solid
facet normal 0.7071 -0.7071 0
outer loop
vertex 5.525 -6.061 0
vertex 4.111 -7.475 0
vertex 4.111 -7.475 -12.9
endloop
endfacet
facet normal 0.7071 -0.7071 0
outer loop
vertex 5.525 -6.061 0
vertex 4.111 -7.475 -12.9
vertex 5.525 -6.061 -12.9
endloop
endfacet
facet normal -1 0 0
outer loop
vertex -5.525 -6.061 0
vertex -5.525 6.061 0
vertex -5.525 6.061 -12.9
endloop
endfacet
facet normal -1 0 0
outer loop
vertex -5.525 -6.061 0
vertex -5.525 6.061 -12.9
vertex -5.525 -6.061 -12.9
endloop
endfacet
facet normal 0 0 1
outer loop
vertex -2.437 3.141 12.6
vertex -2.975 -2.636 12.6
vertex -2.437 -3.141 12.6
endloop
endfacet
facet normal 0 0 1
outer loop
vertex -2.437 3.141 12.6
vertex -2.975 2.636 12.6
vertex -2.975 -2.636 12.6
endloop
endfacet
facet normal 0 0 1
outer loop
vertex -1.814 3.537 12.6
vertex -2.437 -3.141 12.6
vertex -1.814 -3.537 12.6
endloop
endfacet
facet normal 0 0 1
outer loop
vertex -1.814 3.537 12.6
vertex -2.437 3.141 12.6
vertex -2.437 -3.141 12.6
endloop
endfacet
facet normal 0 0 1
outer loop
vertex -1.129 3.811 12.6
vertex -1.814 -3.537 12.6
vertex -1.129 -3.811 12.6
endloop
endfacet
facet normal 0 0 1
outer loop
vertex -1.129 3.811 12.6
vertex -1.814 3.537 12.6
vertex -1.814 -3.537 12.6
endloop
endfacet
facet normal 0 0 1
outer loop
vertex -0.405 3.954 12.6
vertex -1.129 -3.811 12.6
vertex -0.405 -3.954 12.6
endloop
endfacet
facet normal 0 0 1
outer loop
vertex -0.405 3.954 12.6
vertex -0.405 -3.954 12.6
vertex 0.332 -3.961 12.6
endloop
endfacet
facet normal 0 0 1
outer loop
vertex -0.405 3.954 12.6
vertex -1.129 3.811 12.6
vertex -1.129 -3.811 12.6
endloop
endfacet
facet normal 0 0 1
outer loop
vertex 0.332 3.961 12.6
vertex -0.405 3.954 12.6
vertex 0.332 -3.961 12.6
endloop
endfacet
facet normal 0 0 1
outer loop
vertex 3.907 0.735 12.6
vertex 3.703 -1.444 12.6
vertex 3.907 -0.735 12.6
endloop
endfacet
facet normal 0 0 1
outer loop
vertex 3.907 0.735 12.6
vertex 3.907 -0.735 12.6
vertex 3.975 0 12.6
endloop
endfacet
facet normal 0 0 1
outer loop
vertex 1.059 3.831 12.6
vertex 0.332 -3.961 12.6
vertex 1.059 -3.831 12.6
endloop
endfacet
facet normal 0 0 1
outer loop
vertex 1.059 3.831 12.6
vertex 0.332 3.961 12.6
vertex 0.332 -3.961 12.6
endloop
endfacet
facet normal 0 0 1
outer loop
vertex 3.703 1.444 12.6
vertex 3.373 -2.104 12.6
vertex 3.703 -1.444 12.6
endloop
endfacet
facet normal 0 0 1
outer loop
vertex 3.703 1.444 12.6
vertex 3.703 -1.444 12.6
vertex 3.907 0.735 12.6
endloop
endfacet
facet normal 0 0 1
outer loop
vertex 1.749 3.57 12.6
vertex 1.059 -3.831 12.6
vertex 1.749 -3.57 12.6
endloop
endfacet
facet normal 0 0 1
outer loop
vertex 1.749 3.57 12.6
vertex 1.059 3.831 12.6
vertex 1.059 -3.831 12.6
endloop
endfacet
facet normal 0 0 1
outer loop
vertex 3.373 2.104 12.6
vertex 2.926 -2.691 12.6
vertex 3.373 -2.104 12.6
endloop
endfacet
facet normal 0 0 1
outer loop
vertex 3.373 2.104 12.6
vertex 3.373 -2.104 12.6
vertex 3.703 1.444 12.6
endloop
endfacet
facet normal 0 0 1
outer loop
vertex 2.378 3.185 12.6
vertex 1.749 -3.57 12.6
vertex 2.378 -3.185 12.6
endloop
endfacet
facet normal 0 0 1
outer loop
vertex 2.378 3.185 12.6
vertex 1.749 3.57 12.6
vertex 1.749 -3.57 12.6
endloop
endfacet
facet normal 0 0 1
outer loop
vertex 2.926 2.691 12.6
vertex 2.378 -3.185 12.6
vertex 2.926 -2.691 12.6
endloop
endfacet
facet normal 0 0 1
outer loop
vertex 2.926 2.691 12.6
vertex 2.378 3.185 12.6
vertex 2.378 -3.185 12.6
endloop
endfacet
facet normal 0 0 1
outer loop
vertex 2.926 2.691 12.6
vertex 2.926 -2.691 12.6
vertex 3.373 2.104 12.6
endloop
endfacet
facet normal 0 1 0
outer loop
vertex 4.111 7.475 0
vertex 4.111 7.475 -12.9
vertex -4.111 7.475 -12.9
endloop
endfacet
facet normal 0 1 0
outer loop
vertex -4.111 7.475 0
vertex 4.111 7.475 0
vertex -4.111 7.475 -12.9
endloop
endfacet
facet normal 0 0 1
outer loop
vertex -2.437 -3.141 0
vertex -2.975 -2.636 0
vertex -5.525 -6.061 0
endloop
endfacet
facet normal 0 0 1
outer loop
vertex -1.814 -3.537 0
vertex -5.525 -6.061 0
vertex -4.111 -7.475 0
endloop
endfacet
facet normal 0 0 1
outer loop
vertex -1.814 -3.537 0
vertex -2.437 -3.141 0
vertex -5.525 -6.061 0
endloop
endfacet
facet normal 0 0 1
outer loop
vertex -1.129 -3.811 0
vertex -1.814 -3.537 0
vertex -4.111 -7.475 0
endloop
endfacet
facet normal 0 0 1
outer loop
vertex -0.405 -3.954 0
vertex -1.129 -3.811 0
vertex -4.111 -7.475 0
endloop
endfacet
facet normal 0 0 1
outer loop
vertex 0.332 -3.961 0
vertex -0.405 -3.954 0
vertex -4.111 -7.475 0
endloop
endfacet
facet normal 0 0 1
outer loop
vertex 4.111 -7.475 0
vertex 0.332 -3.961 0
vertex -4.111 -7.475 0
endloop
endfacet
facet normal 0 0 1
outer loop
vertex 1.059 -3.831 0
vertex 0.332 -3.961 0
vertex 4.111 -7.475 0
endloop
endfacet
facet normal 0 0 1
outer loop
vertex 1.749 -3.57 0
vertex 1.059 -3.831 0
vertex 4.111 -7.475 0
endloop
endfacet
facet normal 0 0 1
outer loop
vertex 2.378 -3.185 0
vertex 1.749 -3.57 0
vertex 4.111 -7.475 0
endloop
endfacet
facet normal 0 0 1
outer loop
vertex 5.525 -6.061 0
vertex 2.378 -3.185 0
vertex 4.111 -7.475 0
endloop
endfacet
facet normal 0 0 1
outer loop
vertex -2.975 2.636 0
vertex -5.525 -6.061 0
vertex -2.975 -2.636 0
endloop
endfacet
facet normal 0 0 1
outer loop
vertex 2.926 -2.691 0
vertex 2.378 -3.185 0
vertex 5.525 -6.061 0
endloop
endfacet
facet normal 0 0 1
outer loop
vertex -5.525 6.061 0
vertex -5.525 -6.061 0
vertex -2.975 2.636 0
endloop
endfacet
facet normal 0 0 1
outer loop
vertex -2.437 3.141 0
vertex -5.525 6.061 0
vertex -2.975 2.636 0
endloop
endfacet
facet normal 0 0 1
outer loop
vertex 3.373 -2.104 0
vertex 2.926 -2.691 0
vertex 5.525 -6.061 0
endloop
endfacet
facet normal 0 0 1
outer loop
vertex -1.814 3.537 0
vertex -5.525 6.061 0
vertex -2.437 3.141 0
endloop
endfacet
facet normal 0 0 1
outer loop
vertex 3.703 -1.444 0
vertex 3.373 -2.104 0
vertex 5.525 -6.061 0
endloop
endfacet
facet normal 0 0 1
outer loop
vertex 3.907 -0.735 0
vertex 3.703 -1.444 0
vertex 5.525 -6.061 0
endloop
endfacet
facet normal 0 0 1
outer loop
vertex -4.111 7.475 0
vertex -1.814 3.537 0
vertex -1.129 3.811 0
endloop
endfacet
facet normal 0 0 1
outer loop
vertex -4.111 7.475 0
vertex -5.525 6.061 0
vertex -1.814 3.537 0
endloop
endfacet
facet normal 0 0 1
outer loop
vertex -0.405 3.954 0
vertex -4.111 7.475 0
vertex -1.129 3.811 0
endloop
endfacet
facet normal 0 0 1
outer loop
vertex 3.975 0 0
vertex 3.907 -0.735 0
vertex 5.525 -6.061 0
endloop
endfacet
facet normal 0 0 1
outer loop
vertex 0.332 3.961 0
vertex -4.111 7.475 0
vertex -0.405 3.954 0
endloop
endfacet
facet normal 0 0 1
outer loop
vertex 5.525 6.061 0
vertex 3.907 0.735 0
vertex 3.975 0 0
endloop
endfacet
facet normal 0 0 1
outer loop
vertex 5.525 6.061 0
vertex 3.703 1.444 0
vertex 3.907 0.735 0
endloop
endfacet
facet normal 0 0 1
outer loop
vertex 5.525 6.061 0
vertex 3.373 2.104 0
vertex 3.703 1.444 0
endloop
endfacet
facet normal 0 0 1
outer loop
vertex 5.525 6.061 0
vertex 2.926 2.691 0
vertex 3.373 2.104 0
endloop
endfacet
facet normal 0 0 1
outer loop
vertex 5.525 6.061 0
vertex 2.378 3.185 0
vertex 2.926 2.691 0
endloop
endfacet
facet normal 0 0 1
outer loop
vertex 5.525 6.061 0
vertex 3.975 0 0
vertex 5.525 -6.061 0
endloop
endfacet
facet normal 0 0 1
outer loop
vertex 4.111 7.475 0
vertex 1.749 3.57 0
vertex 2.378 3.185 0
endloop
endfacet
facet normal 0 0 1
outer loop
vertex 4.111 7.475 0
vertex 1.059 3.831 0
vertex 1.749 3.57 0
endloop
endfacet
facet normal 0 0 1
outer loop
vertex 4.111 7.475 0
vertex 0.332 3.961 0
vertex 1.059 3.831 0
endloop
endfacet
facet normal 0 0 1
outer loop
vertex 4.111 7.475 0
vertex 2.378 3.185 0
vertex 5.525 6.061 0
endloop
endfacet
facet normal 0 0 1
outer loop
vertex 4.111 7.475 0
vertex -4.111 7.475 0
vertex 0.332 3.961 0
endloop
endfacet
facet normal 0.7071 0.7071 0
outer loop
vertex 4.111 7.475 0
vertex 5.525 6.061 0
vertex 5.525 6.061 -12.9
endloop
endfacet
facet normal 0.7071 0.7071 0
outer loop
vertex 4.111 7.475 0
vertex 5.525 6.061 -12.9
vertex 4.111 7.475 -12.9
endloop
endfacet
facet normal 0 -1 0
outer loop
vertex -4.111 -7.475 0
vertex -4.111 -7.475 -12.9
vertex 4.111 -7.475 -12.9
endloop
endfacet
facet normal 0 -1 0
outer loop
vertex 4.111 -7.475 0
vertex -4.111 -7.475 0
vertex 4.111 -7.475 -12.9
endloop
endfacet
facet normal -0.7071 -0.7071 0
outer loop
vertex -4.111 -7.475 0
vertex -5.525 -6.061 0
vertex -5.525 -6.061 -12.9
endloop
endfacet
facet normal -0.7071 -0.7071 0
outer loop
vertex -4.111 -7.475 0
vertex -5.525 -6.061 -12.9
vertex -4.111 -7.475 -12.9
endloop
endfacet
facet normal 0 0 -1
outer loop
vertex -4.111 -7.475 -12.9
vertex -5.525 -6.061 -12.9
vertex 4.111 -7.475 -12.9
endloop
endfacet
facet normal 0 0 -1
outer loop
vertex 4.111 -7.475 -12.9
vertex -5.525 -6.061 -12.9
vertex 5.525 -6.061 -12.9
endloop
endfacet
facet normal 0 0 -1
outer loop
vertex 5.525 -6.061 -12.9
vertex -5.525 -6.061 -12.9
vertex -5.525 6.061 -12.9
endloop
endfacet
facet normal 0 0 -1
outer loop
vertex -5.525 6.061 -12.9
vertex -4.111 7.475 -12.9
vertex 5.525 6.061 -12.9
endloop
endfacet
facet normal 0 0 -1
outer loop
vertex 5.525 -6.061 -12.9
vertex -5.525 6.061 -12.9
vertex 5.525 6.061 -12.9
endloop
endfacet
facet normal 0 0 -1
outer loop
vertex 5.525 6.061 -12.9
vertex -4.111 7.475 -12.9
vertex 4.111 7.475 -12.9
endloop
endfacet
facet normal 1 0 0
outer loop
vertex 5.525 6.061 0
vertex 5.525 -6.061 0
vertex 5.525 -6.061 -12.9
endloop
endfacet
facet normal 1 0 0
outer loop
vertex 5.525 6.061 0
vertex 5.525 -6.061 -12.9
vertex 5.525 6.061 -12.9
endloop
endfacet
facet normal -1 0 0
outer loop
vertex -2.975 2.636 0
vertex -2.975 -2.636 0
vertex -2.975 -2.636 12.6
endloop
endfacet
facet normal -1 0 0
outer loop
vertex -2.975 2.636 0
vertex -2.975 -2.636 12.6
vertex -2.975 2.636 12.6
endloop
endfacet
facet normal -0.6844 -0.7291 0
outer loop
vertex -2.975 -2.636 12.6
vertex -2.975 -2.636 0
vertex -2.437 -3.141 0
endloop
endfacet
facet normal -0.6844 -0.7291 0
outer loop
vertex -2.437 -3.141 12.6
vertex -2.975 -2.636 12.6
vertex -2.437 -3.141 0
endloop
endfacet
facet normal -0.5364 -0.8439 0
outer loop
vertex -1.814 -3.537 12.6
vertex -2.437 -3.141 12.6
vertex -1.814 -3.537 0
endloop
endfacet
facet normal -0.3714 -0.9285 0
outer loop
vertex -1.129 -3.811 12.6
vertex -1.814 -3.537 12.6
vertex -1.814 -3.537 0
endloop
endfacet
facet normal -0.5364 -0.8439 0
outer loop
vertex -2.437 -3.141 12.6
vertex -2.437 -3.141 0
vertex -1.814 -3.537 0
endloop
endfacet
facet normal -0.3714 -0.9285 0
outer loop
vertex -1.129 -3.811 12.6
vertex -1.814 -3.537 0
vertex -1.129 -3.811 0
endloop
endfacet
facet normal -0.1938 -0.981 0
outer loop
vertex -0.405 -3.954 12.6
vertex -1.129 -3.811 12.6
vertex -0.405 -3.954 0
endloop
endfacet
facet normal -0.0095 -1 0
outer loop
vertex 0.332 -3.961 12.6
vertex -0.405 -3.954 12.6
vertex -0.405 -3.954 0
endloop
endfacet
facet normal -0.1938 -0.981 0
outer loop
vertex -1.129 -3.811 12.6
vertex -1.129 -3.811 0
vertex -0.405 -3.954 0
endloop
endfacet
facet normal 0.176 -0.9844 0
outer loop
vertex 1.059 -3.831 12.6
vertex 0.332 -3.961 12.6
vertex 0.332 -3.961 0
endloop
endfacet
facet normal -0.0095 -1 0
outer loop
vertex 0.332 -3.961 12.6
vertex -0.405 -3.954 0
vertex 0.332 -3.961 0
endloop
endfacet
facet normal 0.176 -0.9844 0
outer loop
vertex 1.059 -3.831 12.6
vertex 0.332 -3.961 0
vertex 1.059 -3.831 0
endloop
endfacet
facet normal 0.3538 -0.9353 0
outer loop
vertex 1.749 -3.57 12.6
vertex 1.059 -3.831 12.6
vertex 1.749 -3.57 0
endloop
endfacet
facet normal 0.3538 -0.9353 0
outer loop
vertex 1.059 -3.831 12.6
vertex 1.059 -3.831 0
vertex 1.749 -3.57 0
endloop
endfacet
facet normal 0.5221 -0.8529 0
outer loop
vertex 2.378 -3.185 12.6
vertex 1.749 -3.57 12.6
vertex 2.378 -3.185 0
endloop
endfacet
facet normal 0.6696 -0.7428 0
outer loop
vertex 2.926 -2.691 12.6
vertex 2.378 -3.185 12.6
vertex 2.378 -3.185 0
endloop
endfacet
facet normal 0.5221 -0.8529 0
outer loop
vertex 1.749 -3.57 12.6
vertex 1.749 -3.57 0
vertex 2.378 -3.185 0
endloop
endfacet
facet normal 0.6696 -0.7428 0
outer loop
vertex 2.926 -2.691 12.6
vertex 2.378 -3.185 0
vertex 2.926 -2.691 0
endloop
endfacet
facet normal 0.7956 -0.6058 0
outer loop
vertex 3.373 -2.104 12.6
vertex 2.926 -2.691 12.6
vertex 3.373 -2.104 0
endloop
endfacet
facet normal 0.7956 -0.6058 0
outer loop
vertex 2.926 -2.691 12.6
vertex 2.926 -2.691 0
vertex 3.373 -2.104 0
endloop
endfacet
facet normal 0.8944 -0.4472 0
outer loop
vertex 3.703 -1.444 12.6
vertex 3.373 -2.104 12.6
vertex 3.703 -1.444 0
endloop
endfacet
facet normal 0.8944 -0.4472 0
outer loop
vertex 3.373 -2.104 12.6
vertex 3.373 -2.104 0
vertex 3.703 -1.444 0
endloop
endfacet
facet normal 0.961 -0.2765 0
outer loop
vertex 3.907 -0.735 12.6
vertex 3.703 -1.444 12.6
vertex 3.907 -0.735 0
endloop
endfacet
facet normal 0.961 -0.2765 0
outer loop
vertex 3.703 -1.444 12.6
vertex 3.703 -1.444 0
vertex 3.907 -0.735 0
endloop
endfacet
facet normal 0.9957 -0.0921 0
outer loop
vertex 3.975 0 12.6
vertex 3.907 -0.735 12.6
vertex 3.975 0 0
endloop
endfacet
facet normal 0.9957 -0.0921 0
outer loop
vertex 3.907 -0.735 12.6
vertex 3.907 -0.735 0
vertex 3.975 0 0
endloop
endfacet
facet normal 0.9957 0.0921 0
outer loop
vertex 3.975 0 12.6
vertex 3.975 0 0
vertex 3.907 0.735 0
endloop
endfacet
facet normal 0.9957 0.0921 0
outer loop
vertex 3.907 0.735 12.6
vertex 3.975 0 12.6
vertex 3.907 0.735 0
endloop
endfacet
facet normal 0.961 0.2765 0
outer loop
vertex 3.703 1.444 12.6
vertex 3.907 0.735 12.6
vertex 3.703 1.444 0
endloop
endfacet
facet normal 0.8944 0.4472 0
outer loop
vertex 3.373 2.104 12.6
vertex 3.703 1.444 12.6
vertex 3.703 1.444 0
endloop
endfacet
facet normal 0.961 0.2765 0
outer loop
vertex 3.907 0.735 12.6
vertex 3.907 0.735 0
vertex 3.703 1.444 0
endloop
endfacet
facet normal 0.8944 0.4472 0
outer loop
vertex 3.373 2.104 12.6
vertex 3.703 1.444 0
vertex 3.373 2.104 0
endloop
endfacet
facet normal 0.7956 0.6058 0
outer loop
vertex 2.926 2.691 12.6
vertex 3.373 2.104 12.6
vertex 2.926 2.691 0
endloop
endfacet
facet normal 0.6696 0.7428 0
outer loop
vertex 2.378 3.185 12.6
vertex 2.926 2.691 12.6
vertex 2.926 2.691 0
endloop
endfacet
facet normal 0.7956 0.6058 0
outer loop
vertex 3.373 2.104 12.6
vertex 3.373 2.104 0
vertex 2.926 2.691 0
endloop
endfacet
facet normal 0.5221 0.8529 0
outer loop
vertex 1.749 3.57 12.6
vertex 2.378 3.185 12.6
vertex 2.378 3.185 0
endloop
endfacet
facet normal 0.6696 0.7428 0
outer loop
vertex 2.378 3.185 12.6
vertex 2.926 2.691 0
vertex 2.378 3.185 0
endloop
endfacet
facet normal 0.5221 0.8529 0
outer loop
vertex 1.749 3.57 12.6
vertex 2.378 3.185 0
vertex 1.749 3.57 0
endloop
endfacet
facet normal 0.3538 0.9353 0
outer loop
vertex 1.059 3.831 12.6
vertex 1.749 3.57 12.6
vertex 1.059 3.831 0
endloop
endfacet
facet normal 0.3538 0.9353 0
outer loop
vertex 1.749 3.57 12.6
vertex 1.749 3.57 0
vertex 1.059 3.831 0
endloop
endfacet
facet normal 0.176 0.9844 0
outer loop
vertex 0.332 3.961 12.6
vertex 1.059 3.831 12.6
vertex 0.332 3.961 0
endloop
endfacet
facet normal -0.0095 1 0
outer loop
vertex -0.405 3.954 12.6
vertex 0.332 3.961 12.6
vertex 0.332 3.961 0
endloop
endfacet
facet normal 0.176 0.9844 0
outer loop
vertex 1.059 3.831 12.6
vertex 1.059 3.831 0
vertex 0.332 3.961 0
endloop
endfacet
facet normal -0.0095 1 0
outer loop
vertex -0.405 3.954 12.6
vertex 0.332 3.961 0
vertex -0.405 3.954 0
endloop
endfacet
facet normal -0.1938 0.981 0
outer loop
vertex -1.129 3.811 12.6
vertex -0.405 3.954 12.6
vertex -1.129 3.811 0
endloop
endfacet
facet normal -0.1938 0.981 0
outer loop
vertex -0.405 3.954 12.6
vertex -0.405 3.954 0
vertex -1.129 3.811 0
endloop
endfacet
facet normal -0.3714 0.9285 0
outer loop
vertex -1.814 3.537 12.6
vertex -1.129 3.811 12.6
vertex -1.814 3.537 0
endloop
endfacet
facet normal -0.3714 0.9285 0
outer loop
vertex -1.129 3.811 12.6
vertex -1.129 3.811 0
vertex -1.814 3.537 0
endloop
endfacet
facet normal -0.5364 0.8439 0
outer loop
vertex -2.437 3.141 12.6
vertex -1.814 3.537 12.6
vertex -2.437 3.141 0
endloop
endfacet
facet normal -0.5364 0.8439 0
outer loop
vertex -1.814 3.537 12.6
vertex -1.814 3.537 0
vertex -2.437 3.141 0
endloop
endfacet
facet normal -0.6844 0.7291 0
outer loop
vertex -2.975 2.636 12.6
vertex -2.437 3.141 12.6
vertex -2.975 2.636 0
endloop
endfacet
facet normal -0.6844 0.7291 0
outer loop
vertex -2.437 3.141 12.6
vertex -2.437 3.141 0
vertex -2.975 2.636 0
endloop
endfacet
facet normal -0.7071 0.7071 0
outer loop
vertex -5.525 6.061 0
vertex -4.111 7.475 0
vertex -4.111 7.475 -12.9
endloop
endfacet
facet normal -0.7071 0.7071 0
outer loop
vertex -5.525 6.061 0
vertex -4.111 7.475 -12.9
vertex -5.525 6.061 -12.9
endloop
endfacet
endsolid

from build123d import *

# Parameters (mm, degrees)
F1_DEPTH = 12.6
F2_DEPTH = 12.6
F4_DEPTH = 12.9


with BuildPart() as f1:
    # F0 (on Top) → F1 (new body)
    with BuildSketch(Plane.XY):
        with BuildLine():
            Line((-2.975, 0), (3.975, 0))
            ThreePointArc((3.975, 0), (1.409787, 3.716601), (-2.975, 2.636285))
            Line((-2.975, 2.636285), (-2.975, 0))
        make_face()
        with BuildLine():
            ThreePointArc((-2.975, -2.636285), (1.409787, -3.716601), (3.975, 0))
            Line((3.975, 0), (-2.975, 0))
            Line((-2.975, 0), (-2.975, -2.636285))
        make_face()
        with BuildLine():
            Line((-2.975, 0), (-2.975, 2.636285))
            ThreePointArc((-2.975, 2.636285), (-3.975, 0), (-2.975, -2.636285))
            Line((-2.975, -2.636285), (-2.975, 0))
        make_face()
    extrude(amount=F1_DEPTH)

    # F0 (on Top) → F2 (cut)
    with BuildSketch(Plane.XY):
        with BuildLine():
            Line((-2.975, 0), (-2.975, 2.636285))
            ThreePointArc((-2.975, 2.636285), (-3.975, 0), (-2.975, -2.636285))
            Line((-2.975, -2.636285), (-2.975, 0))
        make_face()
    extrude(amount=F2_DEPTH, mode=Mode.SUBTRACT)

    # F3 (on face) → F4 (join)
    with BuildSketch(Plane.XY):
        Polygon((5.525, 6.060786), (4.110786, 7.475), (-4.110786, 7.475), (-5.525, 6.060786), (-5.525, -6.060786), (-4.110786, -7.475), (4.110786, -7.475), (5.525, -6.060786), align=None)
    extrude(amount=-F4_DEPTH)


solid = f1.part
